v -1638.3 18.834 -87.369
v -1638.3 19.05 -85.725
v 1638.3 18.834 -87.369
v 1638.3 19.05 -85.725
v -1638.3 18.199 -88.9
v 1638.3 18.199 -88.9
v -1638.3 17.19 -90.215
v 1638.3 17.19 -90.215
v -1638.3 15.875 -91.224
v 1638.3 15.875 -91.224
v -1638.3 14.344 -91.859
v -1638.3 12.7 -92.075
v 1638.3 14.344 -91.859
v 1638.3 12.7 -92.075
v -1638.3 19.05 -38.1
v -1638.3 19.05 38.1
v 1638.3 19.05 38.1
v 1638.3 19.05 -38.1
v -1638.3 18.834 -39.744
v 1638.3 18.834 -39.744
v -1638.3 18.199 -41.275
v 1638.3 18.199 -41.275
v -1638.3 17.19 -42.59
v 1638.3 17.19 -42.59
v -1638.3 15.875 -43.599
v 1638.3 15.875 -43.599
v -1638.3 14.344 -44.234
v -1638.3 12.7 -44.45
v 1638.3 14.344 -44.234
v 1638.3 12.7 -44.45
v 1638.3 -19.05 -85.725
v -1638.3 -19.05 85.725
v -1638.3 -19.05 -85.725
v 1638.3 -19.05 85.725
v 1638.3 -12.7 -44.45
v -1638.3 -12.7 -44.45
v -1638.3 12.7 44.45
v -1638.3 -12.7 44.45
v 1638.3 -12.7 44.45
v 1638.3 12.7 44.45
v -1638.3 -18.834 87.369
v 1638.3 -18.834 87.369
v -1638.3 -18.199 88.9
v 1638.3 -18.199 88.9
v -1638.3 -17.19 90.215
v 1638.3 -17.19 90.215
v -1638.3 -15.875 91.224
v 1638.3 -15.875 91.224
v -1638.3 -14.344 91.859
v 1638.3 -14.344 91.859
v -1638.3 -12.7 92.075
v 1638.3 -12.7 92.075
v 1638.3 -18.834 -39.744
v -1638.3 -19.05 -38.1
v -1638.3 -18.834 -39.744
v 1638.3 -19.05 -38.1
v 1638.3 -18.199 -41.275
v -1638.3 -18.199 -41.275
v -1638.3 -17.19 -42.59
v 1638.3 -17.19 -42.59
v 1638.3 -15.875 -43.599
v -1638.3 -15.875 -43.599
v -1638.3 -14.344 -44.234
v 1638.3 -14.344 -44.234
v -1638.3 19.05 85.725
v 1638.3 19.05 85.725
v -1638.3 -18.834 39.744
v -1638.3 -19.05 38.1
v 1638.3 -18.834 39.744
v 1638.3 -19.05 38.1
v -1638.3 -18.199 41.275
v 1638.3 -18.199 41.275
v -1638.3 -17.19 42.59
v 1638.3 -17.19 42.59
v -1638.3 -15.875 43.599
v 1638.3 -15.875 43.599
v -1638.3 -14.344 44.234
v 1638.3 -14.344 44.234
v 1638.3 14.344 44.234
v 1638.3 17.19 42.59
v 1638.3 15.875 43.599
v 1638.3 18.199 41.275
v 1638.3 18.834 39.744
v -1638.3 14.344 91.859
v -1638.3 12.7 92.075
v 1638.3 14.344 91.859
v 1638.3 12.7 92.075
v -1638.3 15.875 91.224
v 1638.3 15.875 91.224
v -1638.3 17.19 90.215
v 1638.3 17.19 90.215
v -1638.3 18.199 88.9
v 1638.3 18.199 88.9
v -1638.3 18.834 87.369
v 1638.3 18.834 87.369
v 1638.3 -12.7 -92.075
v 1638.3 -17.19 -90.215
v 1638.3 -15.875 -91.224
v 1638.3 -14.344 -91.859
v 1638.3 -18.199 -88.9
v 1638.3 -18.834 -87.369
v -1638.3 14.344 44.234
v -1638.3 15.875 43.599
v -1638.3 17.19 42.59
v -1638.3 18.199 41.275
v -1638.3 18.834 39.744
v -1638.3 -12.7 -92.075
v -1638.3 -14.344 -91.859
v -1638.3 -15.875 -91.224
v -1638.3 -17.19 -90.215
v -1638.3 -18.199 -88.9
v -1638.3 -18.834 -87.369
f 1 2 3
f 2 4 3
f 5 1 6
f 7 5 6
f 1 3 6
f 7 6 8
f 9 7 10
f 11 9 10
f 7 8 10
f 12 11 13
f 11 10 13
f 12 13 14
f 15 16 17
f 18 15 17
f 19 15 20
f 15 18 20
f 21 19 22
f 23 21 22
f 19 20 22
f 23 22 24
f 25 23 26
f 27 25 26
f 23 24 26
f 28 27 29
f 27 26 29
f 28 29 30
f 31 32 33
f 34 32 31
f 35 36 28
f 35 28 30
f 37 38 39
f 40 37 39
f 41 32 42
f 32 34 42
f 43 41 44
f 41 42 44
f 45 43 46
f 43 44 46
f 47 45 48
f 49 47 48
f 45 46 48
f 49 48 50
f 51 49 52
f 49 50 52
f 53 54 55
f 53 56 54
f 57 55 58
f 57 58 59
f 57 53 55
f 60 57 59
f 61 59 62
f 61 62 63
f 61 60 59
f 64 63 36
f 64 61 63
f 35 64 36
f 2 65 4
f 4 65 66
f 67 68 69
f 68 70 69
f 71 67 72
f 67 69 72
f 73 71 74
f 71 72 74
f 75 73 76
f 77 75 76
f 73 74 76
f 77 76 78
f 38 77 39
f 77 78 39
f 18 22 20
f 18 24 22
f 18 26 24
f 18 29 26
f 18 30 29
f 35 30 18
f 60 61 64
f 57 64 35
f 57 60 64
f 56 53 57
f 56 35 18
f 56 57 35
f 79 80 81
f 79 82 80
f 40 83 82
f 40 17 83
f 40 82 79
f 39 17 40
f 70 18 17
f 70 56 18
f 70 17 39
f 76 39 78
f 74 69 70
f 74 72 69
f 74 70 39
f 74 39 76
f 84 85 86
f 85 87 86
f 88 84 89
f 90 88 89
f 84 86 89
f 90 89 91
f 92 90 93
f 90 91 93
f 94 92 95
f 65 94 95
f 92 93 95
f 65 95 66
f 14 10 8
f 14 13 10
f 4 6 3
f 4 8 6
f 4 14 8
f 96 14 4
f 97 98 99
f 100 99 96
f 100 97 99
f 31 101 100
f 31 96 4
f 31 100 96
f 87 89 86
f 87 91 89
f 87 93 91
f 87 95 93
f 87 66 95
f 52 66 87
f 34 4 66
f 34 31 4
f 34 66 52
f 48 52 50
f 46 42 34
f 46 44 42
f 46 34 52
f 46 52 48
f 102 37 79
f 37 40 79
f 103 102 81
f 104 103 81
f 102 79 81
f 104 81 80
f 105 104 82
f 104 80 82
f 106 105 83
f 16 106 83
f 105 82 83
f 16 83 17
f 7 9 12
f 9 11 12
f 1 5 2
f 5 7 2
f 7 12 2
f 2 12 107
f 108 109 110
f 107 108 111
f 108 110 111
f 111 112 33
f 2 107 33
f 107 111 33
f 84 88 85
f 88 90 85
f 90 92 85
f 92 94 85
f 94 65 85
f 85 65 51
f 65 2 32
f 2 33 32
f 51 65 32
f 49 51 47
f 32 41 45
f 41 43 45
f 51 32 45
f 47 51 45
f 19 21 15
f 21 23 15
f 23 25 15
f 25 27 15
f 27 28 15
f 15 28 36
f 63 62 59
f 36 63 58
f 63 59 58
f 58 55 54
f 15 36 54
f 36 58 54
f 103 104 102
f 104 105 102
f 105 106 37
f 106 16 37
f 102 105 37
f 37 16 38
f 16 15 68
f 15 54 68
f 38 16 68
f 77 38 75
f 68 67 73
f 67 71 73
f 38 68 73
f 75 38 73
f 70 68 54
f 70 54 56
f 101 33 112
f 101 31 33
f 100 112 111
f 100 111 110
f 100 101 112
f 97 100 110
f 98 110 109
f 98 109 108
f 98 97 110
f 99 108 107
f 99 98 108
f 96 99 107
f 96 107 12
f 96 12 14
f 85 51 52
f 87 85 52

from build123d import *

# Parameters (mm, degrees)
F0_W     = 3276.6
F0_H     = 88.9
F1_DEPTH = 19.05
F2_R     = 6.35
F3_W     = 3276.6
F3_H     = 184.15
F4_DEPTH = 19.05
F5_R     = 6.35


with BuildPart() as f1:
    # F0 (on Front) → F1 (new body, symmetric)
    with BuildSketch(Plane.XZ):
        Rectangle(F0_W, F0_H)
    extrude(amount=F1_DEPTH, both=True)

    # F2
    f2_edges = [f1.edges().sort_by_distance(p)[0] for p in [
        (0, -19.05, 44.45),
        (0, 19.05, 44.45),
        (0, 19.05, -44.45),
        (0, -19.05, -44.45),
    ]]
    fillet(f2_edges, radius=F2_R)


with BuildPart() as f4:
    # F3 (on Front) → F4 (new body, symmetric)
    with BuildSketch(Plane.XZ):
        Rectangle(F3_W, F3_H)
    extrude(amount=F4_DEPTH, both=True)

    # F5
    f5_edges = [f4.edges().sort_by_distance(p)[0] for p in [
        (0, -19.05, 92.075),
        (0, 19.05, 92.075),
        (0, -19.05, -92.075),
        (0, 19.05, -92.075),
    ]]
    fillet(f5_edges, radius=F5_R)


solid = Compound([f1.part, f4.part])
